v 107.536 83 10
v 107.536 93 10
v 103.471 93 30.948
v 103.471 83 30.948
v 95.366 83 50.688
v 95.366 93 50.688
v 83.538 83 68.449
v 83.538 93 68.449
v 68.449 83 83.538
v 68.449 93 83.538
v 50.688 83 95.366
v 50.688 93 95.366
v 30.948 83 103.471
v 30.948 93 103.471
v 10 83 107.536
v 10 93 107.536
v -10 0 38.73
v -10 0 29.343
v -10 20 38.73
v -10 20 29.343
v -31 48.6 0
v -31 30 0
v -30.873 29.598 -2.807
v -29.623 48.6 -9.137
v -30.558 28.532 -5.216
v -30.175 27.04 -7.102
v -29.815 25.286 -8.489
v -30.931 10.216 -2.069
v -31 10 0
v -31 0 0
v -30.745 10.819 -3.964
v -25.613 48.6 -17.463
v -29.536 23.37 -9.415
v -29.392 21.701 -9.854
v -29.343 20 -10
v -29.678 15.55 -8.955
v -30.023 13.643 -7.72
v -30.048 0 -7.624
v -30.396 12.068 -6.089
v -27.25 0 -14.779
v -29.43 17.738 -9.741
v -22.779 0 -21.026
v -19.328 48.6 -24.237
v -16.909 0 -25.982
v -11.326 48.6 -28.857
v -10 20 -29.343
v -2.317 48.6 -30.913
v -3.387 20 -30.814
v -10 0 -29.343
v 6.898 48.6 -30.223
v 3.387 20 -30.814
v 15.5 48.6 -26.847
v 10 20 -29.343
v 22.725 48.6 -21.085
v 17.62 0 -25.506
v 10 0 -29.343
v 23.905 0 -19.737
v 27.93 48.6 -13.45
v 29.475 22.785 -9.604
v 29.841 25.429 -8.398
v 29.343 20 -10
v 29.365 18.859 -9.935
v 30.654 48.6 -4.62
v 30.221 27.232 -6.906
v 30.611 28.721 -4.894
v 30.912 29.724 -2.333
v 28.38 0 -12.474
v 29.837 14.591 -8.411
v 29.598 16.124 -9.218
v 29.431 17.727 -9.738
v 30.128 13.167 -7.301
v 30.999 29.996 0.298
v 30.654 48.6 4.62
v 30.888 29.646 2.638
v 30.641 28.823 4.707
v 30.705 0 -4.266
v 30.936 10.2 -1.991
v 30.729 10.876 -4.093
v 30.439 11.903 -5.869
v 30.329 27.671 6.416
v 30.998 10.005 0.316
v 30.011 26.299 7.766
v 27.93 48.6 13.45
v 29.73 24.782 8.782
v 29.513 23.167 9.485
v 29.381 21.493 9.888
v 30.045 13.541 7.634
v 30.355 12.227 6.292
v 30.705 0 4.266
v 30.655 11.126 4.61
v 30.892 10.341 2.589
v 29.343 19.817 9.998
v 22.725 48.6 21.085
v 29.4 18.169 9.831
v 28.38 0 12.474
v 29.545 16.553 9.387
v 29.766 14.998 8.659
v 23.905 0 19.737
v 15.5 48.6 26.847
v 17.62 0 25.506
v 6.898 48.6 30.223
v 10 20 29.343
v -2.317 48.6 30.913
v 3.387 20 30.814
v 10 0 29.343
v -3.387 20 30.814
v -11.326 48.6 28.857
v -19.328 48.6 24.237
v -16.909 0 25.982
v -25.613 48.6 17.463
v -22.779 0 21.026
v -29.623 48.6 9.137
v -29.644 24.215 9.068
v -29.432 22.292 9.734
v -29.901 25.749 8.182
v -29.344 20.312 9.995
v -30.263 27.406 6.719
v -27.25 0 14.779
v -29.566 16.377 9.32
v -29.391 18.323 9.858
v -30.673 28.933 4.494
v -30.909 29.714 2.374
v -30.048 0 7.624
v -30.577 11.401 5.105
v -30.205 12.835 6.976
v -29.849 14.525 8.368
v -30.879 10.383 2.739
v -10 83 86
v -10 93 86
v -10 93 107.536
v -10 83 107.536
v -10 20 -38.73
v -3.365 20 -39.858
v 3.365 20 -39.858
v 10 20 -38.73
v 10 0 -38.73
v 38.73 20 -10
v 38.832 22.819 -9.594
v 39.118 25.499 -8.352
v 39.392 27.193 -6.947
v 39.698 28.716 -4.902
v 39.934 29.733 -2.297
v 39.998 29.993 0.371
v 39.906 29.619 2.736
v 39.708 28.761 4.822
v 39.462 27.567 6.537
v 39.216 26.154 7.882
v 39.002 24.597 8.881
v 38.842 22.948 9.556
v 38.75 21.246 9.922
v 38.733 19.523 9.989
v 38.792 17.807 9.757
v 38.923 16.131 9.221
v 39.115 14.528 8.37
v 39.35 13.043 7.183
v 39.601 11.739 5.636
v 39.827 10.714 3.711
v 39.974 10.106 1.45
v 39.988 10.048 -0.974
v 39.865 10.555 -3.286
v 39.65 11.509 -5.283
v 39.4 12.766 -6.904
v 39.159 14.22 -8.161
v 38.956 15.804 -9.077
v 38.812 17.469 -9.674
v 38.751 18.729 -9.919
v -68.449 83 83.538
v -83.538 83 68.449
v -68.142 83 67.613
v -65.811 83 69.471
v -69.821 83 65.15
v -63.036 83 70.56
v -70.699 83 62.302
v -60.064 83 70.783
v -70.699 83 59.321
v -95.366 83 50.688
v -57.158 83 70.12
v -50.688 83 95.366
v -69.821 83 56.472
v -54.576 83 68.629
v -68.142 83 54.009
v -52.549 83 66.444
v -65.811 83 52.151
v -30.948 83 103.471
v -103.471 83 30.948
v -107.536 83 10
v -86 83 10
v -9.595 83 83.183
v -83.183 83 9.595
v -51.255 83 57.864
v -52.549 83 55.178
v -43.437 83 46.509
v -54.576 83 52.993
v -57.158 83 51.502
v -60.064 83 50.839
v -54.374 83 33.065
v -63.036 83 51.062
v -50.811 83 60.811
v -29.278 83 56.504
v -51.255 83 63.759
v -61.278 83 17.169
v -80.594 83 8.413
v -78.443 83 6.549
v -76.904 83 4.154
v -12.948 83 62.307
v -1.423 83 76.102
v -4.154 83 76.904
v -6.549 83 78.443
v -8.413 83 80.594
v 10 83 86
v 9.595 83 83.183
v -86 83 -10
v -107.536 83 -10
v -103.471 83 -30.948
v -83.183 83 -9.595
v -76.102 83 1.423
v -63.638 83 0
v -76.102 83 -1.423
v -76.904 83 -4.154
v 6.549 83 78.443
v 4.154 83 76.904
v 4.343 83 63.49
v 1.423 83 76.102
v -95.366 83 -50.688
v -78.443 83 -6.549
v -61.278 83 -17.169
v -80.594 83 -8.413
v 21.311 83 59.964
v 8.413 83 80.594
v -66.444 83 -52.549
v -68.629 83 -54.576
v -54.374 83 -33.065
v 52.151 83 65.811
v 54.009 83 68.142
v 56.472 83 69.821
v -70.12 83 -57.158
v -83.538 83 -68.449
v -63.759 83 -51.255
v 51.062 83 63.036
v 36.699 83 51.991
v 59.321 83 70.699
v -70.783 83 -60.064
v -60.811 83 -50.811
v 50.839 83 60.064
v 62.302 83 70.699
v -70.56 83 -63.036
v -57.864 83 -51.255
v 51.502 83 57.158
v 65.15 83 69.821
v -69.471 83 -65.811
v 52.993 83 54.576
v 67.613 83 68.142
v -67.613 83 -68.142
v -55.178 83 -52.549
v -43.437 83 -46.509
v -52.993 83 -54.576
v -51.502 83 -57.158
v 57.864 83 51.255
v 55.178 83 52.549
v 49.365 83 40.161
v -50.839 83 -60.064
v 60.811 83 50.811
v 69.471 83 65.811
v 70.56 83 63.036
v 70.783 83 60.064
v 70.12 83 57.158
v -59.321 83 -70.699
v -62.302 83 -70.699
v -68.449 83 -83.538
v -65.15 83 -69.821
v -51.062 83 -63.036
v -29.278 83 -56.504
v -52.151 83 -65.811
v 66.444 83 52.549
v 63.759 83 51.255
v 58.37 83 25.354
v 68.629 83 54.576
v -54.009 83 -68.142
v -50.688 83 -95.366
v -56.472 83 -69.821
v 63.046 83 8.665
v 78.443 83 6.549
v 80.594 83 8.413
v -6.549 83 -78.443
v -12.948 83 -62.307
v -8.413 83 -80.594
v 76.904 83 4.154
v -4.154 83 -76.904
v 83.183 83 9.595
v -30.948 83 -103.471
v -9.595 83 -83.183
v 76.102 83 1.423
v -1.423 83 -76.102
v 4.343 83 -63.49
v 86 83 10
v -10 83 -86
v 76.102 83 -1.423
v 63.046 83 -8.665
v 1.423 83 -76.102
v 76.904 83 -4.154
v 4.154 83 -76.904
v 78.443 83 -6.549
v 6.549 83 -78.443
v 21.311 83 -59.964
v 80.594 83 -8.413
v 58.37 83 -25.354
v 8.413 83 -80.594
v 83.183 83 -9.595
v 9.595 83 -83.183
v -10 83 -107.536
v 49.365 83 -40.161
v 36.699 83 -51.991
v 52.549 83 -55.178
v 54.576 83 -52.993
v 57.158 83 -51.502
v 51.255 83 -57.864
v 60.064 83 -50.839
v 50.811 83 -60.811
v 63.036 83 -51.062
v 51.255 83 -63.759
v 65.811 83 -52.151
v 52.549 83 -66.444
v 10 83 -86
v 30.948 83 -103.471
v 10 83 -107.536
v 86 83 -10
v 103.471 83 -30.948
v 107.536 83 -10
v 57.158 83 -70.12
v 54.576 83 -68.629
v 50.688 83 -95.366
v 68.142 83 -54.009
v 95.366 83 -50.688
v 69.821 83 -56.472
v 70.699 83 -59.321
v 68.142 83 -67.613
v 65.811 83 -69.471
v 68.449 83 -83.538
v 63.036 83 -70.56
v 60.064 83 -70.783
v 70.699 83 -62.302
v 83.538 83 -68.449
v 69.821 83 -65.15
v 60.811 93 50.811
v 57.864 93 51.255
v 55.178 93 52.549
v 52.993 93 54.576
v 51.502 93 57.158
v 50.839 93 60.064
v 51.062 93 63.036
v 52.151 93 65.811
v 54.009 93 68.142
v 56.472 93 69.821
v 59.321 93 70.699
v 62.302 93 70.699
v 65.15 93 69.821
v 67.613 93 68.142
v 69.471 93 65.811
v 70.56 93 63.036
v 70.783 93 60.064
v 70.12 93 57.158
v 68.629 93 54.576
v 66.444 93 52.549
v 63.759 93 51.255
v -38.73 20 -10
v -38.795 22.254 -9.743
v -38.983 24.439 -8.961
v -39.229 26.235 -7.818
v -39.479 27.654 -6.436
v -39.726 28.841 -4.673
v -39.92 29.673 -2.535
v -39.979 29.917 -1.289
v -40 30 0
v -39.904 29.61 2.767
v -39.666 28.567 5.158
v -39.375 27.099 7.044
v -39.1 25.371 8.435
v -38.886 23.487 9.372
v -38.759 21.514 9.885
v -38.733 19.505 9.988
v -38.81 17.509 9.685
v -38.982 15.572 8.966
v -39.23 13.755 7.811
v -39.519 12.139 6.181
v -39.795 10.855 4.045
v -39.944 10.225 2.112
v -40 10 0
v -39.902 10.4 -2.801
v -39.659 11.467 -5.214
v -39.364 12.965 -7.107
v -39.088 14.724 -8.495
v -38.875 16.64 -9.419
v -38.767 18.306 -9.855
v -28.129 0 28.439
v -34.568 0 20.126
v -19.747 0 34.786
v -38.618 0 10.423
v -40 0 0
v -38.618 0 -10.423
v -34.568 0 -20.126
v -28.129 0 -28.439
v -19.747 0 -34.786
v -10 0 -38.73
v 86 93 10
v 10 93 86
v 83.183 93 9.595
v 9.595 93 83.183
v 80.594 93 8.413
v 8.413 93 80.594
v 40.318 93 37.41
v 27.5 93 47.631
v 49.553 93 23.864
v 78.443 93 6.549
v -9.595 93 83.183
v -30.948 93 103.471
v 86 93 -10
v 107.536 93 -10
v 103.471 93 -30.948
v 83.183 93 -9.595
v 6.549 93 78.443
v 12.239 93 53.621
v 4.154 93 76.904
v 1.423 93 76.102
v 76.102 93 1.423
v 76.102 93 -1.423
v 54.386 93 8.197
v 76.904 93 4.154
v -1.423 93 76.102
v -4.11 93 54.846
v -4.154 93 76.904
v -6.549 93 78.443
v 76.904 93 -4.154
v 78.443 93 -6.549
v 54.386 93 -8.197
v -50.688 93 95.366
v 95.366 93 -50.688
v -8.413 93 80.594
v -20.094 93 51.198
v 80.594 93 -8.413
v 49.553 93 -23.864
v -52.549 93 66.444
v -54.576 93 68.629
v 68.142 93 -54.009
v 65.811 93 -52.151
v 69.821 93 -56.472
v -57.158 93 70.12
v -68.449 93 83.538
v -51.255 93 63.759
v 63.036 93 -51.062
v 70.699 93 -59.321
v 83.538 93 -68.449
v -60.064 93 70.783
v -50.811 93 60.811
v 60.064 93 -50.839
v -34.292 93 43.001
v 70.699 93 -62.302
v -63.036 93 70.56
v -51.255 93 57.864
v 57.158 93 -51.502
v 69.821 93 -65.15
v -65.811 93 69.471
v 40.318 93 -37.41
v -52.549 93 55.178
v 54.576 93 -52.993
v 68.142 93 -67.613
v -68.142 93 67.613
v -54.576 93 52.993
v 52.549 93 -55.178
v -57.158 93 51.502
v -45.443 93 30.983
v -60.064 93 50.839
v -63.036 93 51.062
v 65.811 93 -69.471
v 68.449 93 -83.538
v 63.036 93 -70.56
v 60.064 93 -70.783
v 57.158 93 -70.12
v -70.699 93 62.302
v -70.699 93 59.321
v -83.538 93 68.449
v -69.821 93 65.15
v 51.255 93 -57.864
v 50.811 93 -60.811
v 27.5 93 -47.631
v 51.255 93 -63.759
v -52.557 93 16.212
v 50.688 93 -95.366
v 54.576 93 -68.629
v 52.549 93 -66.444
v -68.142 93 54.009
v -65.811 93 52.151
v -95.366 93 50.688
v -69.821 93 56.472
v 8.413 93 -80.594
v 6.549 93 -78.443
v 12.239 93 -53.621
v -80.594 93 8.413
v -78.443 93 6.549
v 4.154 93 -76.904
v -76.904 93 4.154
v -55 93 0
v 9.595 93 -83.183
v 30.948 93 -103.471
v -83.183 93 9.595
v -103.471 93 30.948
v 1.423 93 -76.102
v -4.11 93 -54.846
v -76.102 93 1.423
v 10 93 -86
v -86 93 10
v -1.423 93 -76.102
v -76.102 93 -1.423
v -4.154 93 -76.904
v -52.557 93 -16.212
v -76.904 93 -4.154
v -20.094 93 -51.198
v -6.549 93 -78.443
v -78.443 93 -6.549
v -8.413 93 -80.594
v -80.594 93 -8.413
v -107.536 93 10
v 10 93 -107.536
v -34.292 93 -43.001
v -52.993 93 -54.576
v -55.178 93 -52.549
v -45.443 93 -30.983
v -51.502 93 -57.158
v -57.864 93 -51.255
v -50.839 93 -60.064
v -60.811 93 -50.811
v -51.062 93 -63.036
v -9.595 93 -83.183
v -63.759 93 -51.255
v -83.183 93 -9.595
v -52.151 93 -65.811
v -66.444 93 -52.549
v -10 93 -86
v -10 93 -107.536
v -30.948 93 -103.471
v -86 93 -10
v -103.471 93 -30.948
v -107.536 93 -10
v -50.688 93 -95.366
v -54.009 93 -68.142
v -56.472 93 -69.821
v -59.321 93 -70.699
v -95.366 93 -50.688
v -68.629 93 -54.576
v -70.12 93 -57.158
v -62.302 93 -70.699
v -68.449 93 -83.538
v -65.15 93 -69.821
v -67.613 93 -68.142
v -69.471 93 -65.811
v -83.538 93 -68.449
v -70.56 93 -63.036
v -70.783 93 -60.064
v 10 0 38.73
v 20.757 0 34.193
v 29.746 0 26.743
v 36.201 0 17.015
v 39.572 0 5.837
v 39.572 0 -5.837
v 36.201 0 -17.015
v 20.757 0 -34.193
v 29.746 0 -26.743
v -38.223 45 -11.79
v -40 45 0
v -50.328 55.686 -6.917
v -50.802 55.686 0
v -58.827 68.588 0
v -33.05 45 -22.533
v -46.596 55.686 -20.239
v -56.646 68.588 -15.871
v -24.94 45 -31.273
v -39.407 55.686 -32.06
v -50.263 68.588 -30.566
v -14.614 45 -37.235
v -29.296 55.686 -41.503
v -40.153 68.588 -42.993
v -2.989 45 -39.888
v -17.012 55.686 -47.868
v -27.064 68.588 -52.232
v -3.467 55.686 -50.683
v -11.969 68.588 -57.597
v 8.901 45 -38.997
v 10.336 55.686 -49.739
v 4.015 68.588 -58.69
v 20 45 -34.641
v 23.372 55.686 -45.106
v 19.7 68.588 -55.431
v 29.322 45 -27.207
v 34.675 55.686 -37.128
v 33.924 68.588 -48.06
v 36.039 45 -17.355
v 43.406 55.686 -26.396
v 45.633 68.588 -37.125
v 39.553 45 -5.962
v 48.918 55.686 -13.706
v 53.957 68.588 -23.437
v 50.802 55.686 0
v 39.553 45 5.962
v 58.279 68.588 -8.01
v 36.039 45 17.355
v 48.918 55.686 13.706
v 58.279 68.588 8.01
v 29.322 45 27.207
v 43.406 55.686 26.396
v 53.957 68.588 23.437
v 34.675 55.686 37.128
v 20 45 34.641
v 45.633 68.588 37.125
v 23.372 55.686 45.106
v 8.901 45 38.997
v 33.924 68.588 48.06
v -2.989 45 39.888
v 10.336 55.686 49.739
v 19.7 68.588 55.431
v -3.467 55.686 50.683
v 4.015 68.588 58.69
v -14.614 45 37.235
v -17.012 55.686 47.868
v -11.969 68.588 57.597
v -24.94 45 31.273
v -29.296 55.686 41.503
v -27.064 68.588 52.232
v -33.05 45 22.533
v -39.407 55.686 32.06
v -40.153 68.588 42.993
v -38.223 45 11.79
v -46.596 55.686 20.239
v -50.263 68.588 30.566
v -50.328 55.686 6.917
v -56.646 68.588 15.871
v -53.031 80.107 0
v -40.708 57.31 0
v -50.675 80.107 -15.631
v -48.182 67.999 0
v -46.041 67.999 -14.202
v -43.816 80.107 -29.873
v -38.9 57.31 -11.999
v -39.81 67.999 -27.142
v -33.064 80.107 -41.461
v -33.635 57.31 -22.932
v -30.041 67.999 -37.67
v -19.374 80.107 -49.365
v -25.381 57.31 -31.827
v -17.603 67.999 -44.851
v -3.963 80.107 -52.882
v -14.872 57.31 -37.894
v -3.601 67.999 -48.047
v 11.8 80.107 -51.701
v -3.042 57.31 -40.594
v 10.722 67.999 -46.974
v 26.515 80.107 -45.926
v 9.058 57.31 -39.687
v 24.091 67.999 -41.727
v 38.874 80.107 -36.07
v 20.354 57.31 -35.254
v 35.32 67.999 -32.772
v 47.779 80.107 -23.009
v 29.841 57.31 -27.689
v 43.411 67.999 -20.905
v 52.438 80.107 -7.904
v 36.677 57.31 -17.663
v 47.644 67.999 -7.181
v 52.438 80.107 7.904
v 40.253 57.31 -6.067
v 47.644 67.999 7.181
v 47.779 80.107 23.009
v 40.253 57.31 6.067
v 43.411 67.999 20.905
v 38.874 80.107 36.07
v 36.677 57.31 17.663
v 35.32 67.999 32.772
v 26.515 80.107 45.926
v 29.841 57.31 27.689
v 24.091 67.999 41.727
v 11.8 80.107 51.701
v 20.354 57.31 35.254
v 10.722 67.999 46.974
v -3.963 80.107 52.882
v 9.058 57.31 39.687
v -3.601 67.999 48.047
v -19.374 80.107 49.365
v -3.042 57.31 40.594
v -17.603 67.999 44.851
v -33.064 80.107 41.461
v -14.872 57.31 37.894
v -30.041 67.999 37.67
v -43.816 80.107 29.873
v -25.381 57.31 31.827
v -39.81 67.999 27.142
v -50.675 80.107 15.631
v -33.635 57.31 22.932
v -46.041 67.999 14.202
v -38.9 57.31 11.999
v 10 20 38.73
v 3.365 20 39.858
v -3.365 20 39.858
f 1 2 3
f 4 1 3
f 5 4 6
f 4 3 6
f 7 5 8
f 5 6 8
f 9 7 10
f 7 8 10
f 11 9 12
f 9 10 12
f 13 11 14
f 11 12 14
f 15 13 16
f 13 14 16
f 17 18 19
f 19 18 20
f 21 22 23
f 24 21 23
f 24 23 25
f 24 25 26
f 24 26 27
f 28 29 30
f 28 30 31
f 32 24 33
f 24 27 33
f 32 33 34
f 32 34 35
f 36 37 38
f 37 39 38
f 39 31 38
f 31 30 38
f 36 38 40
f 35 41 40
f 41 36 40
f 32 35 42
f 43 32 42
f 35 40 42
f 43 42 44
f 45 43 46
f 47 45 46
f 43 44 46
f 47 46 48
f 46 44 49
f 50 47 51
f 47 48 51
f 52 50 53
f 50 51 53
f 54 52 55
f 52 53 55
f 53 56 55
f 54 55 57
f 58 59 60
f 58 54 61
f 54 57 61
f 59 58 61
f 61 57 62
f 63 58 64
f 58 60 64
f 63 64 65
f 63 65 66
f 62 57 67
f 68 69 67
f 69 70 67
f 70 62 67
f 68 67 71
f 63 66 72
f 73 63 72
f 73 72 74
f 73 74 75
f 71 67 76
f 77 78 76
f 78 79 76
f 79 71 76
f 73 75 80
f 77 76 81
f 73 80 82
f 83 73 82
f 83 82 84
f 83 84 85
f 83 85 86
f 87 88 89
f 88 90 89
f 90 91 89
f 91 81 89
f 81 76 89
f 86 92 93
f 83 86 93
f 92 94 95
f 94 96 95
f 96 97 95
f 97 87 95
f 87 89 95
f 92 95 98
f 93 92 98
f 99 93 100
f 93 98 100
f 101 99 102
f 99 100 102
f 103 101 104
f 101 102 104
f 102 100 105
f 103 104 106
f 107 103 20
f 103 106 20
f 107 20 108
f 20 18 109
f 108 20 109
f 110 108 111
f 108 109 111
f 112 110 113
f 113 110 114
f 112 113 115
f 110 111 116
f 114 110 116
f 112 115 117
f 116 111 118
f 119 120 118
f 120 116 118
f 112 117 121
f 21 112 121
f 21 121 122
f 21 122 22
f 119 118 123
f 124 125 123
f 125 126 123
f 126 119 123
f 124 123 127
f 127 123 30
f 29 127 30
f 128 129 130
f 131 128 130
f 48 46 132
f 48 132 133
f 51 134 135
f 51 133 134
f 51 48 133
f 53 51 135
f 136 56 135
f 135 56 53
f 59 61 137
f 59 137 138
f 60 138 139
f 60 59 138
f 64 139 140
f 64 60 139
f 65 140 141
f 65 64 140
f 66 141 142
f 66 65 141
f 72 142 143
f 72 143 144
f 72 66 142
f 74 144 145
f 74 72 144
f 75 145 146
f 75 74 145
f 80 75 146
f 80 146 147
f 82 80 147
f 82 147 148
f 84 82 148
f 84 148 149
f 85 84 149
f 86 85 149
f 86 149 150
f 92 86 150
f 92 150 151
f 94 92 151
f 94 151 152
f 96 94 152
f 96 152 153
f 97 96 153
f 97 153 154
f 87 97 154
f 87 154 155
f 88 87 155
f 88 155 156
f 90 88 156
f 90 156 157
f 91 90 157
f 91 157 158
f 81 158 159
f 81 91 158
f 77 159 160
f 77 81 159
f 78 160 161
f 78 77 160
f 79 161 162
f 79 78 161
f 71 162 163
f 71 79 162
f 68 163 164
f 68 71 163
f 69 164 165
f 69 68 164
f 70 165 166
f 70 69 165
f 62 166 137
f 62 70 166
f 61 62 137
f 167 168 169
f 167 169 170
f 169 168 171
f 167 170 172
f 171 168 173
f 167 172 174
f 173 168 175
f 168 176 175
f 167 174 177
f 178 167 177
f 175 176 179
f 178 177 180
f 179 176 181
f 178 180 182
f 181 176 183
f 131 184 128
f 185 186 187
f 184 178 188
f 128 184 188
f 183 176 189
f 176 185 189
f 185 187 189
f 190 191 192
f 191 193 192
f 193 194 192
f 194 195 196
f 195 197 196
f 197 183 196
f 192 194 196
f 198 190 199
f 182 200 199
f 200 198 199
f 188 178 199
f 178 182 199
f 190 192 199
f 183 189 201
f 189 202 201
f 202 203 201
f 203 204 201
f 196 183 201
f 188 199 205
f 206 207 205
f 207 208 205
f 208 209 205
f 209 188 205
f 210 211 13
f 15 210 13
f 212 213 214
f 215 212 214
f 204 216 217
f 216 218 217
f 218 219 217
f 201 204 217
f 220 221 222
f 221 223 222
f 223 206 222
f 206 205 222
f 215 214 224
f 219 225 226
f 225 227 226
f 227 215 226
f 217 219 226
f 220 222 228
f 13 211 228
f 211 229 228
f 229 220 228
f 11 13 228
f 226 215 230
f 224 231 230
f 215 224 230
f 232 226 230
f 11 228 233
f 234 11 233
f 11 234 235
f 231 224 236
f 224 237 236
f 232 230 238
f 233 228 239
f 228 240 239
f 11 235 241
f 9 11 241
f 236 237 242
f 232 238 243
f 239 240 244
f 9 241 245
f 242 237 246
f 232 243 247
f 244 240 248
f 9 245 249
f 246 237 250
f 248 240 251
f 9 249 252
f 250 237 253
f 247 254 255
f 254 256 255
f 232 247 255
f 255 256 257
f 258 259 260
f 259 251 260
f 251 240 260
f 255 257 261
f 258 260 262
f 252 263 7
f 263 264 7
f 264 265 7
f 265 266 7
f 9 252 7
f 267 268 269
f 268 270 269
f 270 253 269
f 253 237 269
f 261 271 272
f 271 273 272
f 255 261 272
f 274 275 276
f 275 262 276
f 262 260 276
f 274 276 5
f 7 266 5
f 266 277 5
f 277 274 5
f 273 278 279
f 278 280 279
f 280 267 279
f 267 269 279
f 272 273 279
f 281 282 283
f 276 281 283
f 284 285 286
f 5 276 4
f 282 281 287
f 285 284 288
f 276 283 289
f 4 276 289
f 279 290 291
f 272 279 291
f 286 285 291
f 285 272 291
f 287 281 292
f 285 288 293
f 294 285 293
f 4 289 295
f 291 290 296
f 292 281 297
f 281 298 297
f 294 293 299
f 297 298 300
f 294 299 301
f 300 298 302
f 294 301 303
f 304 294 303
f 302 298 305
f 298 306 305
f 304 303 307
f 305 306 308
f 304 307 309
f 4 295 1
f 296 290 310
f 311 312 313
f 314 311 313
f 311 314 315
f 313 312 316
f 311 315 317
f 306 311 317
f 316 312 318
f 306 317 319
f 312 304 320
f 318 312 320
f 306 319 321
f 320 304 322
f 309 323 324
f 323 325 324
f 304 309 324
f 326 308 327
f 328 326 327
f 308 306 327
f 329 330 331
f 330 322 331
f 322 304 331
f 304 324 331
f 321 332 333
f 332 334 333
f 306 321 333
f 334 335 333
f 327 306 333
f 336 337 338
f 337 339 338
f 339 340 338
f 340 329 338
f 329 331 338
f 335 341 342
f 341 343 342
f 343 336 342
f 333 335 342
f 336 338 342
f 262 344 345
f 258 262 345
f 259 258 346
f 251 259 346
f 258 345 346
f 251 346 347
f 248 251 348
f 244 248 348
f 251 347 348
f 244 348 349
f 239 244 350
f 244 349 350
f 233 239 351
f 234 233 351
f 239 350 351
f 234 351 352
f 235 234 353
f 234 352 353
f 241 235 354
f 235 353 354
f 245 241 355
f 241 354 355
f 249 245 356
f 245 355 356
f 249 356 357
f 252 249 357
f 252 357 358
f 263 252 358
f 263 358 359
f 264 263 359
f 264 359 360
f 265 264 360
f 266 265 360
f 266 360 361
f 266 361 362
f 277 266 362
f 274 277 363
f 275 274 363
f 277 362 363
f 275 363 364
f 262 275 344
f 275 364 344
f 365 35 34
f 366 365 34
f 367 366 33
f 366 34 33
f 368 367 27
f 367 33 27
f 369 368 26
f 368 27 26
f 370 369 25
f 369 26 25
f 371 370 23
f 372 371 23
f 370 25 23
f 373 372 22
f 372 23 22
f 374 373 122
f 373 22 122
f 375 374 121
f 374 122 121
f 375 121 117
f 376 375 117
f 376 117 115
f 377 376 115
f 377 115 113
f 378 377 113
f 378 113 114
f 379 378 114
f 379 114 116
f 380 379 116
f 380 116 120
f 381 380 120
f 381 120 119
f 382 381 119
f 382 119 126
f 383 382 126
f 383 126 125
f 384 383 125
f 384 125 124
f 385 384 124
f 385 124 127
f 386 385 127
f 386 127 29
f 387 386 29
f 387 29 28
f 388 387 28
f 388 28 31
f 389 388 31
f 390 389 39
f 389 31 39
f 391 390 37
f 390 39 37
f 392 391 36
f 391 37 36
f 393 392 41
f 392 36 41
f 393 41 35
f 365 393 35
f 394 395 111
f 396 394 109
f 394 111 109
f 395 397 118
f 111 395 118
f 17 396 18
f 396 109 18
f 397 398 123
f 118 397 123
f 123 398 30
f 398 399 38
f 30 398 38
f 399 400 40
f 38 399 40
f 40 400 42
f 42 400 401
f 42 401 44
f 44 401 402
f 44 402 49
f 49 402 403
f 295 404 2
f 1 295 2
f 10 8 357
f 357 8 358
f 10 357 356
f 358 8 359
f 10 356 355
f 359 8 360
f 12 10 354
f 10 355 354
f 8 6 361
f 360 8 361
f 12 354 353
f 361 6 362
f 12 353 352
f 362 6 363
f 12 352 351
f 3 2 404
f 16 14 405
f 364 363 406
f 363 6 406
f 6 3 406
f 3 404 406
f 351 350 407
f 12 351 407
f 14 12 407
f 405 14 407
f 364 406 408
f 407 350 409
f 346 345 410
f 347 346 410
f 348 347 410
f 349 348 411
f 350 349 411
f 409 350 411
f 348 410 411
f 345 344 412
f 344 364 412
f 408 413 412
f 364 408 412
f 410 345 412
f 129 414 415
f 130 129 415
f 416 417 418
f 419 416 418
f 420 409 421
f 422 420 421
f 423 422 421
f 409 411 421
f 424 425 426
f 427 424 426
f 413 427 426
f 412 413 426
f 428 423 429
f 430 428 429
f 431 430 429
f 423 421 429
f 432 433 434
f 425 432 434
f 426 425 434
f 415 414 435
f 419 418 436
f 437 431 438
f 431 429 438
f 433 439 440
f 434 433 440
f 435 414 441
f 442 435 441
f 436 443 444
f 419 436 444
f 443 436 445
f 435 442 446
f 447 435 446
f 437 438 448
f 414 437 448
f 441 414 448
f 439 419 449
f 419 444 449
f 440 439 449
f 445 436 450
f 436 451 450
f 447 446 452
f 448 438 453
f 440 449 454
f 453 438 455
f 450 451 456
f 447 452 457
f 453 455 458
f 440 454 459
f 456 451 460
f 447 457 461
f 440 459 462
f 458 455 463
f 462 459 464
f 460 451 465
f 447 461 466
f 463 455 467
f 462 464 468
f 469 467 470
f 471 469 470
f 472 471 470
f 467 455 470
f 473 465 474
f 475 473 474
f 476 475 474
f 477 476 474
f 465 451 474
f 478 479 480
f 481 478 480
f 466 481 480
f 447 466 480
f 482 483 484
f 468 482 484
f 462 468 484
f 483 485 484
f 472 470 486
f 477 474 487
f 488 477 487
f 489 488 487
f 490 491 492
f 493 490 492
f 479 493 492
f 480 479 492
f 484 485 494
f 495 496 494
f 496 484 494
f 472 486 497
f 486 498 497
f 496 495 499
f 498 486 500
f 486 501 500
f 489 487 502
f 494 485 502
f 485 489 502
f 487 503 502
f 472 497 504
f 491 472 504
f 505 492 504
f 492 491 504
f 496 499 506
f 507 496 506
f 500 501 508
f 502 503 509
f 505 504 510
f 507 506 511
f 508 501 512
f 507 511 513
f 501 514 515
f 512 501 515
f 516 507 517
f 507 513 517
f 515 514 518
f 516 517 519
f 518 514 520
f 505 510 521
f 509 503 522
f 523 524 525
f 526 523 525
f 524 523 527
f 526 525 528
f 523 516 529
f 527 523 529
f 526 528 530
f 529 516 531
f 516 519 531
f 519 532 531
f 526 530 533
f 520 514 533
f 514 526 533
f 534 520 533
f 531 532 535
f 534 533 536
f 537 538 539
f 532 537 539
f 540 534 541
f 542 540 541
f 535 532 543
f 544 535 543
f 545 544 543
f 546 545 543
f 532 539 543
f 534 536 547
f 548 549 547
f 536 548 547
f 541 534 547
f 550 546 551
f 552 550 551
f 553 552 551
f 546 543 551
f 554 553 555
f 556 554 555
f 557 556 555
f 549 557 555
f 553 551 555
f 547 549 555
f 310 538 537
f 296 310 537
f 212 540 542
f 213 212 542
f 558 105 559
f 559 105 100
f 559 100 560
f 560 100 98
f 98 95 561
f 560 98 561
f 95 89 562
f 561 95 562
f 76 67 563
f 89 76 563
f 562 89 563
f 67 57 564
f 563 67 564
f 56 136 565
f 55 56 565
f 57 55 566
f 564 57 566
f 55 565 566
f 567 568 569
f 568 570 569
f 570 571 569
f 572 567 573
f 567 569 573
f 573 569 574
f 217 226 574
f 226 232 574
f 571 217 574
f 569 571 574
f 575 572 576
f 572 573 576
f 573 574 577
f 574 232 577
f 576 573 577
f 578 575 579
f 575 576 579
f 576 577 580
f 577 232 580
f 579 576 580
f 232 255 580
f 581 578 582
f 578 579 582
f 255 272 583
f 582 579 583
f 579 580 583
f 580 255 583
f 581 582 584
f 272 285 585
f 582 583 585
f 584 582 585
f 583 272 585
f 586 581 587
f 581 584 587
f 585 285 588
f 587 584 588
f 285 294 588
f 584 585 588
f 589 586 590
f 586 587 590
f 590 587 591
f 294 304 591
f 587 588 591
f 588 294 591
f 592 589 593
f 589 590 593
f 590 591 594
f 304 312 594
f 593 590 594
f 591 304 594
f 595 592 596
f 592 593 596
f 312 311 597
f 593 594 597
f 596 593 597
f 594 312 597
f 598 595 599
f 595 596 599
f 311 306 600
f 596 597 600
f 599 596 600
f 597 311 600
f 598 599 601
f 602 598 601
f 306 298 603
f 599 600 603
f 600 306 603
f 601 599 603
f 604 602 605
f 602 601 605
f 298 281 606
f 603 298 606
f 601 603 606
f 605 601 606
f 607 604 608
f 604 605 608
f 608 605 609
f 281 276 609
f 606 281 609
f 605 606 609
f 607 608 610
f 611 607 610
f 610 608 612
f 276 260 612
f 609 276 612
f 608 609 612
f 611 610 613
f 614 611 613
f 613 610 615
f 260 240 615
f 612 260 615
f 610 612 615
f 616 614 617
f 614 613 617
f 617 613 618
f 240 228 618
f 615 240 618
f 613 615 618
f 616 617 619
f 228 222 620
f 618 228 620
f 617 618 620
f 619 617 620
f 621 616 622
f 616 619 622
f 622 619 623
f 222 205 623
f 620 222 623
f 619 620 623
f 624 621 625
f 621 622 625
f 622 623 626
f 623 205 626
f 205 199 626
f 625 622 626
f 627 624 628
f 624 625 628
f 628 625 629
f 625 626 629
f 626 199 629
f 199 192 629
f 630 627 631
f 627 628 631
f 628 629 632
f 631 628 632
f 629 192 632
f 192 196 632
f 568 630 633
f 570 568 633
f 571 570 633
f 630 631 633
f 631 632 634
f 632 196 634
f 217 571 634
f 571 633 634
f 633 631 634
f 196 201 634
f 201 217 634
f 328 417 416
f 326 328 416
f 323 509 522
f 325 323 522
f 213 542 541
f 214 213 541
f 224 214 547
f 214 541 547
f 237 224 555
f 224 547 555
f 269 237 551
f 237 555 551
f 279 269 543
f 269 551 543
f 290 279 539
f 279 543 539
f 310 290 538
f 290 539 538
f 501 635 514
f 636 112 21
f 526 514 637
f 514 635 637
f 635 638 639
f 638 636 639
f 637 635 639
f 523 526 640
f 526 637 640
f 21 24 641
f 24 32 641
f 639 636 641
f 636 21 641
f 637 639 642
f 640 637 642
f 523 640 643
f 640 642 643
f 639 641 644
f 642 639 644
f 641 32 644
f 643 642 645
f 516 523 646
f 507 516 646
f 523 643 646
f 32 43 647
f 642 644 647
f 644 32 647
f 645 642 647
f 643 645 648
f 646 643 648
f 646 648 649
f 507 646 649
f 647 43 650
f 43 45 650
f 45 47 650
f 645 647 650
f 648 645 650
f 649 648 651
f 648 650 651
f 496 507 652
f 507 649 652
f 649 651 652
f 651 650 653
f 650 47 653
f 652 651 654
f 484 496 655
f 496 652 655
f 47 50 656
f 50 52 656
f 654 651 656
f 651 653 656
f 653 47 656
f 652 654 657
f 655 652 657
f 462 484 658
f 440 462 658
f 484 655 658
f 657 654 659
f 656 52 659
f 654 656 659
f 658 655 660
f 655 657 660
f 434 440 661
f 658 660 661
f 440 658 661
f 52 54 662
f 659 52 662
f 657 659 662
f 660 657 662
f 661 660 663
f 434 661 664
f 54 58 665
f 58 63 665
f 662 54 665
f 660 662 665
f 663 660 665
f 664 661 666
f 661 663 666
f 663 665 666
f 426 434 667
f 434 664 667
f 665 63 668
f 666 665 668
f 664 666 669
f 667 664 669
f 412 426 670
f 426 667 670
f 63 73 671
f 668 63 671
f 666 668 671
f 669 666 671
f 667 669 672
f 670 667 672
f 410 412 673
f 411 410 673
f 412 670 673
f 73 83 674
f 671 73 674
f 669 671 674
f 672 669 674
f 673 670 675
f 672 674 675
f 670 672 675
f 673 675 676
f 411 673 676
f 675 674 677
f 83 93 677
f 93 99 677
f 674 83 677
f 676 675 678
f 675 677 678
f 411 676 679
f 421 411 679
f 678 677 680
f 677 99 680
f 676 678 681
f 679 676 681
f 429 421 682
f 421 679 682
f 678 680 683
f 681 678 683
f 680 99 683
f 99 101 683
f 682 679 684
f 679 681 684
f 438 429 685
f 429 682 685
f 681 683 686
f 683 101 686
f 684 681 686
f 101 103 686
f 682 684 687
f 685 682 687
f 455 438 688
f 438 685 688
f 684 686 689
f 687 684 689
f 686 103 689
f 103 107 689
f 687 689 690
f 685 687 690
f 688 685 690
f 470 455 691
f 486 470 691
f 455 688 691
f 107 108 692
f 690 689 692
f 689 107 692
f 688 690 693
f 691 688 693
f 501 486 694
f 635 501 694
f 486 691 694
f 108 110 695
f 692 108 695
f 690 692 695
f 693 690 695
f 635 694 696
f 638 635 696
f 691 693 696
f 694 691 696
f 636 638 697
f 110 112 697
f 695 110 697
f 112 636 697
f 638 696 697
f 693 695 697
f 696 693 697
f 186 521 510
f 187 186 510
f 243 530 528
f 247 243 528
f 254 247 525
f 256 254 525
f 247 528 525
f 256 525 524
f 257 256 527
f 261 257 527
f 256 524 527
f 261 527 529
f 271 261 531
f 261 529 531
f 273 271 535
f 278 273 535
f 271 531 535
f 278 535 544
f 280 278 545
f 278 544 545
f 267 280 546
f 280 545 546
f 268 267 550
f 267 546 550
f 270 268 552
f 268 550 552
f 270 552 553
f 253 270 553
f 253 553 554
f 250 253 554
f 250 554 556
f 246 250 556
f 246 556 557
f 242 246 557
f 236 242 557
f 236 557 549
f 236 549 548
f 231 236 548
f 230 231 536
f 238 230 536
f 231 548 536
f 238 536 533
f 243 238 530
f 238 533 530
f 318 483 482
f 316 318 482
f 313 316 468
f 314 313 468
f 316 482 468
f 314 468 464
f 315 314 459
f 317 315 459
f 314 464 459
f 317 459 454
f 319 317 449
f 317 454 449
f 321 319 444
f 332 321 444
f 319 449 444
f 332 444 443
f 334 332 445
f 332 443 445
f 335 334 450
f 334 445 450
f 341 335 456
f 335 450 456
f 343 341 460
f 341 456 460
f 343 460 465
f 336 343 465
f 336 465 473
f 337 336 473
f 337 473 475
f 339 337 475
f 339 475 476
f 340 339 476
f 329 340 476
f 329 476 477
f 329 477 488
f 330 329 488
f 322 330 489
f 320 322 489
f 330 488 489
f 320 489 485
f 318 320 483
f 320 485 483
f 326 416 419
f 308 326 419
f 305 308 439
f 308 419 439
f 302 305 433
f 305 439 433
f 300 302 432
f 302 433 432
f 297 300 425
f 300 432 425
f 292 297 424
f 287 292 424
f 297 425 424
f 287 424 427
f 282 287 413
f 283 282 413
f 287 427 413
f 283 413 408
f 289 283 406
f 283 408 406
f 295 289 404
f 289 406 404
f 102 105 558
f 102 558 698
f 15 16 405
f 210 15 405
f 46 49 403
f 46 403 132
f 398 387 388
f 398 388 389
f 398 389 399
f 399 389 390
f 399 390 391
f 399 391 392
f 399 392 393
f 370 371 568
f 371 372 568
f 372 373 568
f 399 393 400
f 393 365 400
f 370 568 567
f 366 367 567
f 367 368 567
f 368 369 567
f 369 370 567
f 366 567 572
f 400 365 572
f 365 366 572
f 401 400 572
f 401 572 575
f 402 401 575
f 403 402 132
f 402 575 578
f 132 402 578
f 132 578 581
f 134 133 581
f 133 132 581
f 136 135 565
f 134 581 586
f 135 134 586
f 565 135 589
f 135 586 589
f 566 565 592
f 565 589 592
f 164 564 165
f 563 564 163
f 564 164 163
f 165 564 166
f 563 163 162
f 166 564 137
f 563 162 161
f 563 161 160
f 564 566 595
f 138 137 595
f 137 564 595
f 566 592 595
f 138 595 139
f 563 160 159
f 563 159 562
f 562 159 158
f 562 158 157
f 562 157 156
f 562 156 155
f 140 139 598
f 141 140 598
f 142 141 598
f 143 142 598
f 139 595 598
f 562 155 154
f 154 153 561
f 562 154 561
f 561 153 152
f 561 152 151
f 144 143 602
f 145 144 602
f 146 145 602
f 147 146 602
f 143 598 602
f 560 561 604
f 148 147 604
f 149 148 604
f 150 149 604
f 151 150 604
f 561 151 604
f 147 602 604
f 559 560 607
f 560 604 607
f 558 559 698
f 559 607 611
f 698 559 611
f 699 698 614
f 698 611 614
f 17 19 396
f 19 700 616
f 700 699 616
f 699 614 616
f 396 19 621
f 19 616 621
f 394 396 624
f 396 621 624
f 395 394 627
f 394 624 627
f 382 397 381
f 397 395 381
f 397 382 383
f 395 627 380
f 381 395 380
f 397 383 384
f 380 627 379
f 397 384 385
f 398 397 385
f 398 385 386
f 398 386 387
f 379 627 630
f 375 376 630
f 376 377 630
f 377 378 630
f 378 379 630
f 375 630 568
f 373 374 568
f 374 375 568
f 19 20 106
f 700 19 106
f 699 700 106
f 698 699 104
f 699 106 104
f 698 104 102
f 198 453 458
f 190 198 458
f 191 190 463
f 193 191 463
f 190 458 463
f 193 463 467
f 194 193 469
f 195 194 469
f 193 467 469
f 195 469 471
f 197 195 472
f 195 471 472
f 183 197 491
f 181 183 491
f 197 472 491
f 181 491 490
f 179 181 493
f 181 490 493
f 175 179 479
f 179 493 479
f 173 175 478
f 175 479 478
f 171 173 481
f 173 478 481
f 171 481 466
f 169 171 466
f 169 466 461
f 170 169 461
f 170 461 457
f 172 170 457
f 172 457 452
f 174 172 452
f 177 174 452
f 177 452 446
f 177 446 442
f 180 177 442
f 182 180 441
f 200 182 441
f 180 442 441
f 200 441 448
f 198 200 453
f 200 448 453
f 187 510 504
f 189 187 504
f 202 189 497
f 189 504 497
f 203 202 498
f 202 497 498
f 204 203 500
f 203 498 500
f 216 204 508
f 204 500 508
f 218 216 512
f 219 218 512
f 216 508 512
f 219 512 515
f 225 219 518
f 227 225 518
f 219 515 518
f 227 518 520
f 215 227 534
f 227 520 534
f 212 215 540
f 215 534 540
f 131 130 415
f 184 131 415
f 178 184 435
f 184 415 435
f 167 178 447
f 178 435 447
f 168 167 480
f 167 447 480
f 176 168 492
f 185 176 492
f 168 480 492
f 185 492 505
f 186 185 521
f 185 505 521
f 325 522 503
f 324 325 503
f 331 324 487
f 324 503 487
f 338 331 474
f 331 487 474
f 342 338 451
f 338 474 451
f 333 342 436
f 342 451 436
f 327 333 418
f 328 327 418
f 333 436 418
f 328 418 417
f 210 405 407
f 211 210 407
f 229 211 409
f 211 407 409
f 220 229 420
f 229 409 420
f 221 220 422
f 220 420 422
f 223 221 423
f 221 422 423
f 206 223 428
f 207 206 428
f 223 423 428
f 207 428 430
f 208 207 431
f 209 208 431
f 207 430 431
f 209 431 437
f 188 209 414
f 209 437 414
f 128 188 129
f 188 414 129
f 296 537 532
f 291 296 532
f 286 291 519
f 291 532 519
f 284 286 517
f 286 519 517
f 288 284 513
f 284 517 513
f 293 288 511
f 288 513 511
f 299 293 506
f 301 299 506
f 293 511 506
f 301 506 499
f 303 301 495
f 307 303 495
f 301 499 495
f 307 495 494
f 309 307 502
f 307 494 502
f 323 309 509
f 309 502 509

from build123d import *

# Parameters (mm, degrees)
SCHIZZO2_R                           = 10
TAGLIO_ESTRUSIONE2_DEPTH             = 10
RIPETIZIONECIRCOLARE2_COUNT          = 4
TAGLIO_ESTRUSIONE3_REACH             = 180.261
SCHIZZO4_R                           = 10
TAGLIO_ESTRUSIONE3_DIRECTION_2_REACH = 180.261
TAGLIO_ESTRUSIONE4_REACH             = 180.261
SCHIZZO5_W                           = 20
SCHIZZO5_H                           = 20
TAGLIO_ESTRUSIONE4_DIRECTION_2_REACH = 180.261


with BuildPart() as part:
    # Schizzo1 → Rivoluzione1 (revolve)
    with BuildSketch(Plane.XY, mode=Mode.PRIVATE) as rivoluzione1_sk:
        with BuildLine():
            Line((31, 0), (40, 0))
            Line((40, 0), (40, 45))
            ThreePointArc((40, 45), (55.192640723, 61.901498667), (63.638363359, 83))
            Line((63.638363359, 83), (108, 83))
            Line((108, 83), (108, 93))
            Line((108, 93), (55, 93))
            ThreePointArc((55, 93), (48.182091863, 67.998869263), (31, 48.6))
            Line((31, 48.6), (31, 0))
        make_face()
    revolve(rivoluzione1_sk.sketch.rotate(Axis((0, 136.24893985, 0), (0, -1, 0)), 180), axis=Axis((0, 136.24893985, 0), (0, -1, 0)))

    # Schizzo2 → Taglio-Estrusione2 (cut)
    with BuildSketch(Plane(origin=(0, 93, 0), x_dir=(1, 0, 0), z_dir=(0, 1, 0))):
        with Locations(Location((60.811183182, 60.811183182, 0), (0, 0, 180))):
            Circle(SCHIZZO2_R)
        with BuildLine():
            Line((107.53604047, 10), (86, 10))
            ThreePointArc((86, 10), (76, 0), (86, -10))
            Line((86, -10), (107.53604047, -10))
            ThreePointArc((107.53604047, -10), (108, 0), (107.53604047, 10))
        make_face()
    taglio_estrusione2 = extrude(amount=-TAGLIO_ESTRUSIONE2_DEPTH, mode=Mode.SUBTRACT)

    # RipetizioneCircolare2: Taglio-Estrusione2 ×4 about axis
    ripetizionecircolare2_axis = Axis((0, 0, 0), (0, 1, 0))
    for i in range(1, RIPETIZIONECIRCOLARE2_COUNT):
        add(taglio_estrusione2.rotate(ripetizionecircolare2_axis, i * 360 / RIPETIZIONECIRCOLARE2_COUNT), mode=Mode.SUBTRACT)

    # Schizzo4 → Taglio-Estrusione3 (cut, up to next)
    with BuildSketch(Plane(origin=(0, 0, 0), x_dir=(0, 0, -1), z_dir=(1, 0, 0)), mode=Mode.PRIVATE) as taglio_estrusione3_sk1:
        with Locations((0, 20)):
            Circle(SCHIZZO4_R)
    taglio_estrusione3_tool1 = extrude(taglio_estrusione3_sk1.sketch, amount=-TAGLIO_ESTRUSIONE3_REACH, mode=Mode.PRIVATE) & part.part
    add(taglio_estrusione3_tool1.solids().sort_by_distance((0, 20, 0))[0], mode=Mode.SUBTRACT)

    # Schizzo4 → Taglio-Estrusione3 direction 2 (cut, up to next)
    with BuildSketch(Plane(origin=(0, 0, 0), x_dir=(0, 0, -1), z_dir=(1, 0, 0)), mode=Mode.PRIVATE) as taglio_estrusione3_direction_2_sk1:
        with Locations((0, 20)):
            Circle(SCHIZZO4_R)
    taglio_estrusione3_direction_2_tool1 = extrude(taglio_estrusione3_direction_2_sk1.sketch, amount=TAGLIO_ESTRUSIONE3_DIRECTION_2_REACH, mode=Mode.PRIVATE) & part.part
    add(taglio_estrusione3_direction_2_tool1.solids().sort_by_distance((0, 20, 0))[0], mode=Mode.SUBTRACT)

    # Schizzo5 → Taglio-Estrusione4 (cut, up to next)
    with BuildSketch(Plane.XY, mode=Mode.PRIVATE) as taglio_estrusione4_sk1:
        with Locations((0, 10)):
            Rectangle(SCHIZZO5_W, SCHIZZO5_H)
    taglio_estrusione4_tool1 = extrude(taglio_estrusione4_sk1.sketch, amount=-TAGLIO_ESTRUSIONE4_REACH, mode=Mode.PRIVATE) & part.part
    add(taglio_estrusione4_tool1.solids().sort_by_distance((0, 10, 0))[0], mode=Mode.SUBTRACT)

    # Schizzo5 → Taglio-Estrusione4 direction 2 (cut, up to next)
    with BuildSketch(Plane.XY, mode=Mode.PRIVATE) as taglio_estrusione4_direction_2_sk1:
        with Locations((0, 10)):
            Rectangle(SCHIZZO5_W, SCHIZZO5_H)
    taglio_estrusione4_direction_2_tool1 = extrude(taglio_estrusione4_direction_2_sk1.sketch, amount=TAGLIO_ESTRUSIONE4_DIRECTION_2_REACH, mode=Mode.PRIVATE) & part.part
    add(taglio_estrusione4_direction_2_tool1.solids().sort_by_distance((0, 10, 0))[0], mode=Mode.SUBTRACT)


solid = part.part
